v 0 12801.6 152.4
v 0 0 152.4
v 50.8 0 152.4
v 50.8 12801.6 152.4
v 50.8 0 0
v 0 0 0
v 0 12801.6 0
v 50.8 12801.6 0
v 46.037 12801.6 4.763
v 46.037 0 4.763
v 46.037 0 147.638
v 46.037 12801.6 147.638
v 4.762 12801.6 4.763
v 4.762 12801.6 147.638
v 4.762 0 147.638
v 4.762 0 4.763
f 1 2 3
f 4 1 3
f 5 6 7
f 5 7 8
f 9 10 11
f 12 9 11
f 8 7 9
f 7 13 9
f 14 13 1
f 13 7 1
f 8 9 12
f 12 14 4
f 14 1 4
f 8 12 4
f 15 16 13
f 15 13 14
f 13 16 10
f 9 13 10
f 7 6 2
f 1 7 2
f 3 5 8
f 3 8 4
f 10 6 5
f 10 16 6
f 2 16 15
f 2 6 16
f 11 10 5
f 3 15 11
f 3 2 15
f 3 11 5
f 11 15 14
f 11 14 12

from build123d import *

# Parameters (mm, degrees)
F0_W     = 50.8
F0_H     = 152.4
F0_W_2   = 41.275
F0_H_2   = 142.875
F1_DEPTH = 12801.6


with BuildPart() as f1:
    # F0 (on Front) → F1 (new body)
    with BuildSketch(Plane.XZ):
        with Locations((25.4, 76.2)):
            Rectangle(F0_W, F0_H)
        with Locations((25.4, 76.2)):
            Rectangle(F0_W_2, F0_H_2, mode=Mode.SUBTRACT)
    extrude(amount=-F1_DEPTH)


solid = f1.part
